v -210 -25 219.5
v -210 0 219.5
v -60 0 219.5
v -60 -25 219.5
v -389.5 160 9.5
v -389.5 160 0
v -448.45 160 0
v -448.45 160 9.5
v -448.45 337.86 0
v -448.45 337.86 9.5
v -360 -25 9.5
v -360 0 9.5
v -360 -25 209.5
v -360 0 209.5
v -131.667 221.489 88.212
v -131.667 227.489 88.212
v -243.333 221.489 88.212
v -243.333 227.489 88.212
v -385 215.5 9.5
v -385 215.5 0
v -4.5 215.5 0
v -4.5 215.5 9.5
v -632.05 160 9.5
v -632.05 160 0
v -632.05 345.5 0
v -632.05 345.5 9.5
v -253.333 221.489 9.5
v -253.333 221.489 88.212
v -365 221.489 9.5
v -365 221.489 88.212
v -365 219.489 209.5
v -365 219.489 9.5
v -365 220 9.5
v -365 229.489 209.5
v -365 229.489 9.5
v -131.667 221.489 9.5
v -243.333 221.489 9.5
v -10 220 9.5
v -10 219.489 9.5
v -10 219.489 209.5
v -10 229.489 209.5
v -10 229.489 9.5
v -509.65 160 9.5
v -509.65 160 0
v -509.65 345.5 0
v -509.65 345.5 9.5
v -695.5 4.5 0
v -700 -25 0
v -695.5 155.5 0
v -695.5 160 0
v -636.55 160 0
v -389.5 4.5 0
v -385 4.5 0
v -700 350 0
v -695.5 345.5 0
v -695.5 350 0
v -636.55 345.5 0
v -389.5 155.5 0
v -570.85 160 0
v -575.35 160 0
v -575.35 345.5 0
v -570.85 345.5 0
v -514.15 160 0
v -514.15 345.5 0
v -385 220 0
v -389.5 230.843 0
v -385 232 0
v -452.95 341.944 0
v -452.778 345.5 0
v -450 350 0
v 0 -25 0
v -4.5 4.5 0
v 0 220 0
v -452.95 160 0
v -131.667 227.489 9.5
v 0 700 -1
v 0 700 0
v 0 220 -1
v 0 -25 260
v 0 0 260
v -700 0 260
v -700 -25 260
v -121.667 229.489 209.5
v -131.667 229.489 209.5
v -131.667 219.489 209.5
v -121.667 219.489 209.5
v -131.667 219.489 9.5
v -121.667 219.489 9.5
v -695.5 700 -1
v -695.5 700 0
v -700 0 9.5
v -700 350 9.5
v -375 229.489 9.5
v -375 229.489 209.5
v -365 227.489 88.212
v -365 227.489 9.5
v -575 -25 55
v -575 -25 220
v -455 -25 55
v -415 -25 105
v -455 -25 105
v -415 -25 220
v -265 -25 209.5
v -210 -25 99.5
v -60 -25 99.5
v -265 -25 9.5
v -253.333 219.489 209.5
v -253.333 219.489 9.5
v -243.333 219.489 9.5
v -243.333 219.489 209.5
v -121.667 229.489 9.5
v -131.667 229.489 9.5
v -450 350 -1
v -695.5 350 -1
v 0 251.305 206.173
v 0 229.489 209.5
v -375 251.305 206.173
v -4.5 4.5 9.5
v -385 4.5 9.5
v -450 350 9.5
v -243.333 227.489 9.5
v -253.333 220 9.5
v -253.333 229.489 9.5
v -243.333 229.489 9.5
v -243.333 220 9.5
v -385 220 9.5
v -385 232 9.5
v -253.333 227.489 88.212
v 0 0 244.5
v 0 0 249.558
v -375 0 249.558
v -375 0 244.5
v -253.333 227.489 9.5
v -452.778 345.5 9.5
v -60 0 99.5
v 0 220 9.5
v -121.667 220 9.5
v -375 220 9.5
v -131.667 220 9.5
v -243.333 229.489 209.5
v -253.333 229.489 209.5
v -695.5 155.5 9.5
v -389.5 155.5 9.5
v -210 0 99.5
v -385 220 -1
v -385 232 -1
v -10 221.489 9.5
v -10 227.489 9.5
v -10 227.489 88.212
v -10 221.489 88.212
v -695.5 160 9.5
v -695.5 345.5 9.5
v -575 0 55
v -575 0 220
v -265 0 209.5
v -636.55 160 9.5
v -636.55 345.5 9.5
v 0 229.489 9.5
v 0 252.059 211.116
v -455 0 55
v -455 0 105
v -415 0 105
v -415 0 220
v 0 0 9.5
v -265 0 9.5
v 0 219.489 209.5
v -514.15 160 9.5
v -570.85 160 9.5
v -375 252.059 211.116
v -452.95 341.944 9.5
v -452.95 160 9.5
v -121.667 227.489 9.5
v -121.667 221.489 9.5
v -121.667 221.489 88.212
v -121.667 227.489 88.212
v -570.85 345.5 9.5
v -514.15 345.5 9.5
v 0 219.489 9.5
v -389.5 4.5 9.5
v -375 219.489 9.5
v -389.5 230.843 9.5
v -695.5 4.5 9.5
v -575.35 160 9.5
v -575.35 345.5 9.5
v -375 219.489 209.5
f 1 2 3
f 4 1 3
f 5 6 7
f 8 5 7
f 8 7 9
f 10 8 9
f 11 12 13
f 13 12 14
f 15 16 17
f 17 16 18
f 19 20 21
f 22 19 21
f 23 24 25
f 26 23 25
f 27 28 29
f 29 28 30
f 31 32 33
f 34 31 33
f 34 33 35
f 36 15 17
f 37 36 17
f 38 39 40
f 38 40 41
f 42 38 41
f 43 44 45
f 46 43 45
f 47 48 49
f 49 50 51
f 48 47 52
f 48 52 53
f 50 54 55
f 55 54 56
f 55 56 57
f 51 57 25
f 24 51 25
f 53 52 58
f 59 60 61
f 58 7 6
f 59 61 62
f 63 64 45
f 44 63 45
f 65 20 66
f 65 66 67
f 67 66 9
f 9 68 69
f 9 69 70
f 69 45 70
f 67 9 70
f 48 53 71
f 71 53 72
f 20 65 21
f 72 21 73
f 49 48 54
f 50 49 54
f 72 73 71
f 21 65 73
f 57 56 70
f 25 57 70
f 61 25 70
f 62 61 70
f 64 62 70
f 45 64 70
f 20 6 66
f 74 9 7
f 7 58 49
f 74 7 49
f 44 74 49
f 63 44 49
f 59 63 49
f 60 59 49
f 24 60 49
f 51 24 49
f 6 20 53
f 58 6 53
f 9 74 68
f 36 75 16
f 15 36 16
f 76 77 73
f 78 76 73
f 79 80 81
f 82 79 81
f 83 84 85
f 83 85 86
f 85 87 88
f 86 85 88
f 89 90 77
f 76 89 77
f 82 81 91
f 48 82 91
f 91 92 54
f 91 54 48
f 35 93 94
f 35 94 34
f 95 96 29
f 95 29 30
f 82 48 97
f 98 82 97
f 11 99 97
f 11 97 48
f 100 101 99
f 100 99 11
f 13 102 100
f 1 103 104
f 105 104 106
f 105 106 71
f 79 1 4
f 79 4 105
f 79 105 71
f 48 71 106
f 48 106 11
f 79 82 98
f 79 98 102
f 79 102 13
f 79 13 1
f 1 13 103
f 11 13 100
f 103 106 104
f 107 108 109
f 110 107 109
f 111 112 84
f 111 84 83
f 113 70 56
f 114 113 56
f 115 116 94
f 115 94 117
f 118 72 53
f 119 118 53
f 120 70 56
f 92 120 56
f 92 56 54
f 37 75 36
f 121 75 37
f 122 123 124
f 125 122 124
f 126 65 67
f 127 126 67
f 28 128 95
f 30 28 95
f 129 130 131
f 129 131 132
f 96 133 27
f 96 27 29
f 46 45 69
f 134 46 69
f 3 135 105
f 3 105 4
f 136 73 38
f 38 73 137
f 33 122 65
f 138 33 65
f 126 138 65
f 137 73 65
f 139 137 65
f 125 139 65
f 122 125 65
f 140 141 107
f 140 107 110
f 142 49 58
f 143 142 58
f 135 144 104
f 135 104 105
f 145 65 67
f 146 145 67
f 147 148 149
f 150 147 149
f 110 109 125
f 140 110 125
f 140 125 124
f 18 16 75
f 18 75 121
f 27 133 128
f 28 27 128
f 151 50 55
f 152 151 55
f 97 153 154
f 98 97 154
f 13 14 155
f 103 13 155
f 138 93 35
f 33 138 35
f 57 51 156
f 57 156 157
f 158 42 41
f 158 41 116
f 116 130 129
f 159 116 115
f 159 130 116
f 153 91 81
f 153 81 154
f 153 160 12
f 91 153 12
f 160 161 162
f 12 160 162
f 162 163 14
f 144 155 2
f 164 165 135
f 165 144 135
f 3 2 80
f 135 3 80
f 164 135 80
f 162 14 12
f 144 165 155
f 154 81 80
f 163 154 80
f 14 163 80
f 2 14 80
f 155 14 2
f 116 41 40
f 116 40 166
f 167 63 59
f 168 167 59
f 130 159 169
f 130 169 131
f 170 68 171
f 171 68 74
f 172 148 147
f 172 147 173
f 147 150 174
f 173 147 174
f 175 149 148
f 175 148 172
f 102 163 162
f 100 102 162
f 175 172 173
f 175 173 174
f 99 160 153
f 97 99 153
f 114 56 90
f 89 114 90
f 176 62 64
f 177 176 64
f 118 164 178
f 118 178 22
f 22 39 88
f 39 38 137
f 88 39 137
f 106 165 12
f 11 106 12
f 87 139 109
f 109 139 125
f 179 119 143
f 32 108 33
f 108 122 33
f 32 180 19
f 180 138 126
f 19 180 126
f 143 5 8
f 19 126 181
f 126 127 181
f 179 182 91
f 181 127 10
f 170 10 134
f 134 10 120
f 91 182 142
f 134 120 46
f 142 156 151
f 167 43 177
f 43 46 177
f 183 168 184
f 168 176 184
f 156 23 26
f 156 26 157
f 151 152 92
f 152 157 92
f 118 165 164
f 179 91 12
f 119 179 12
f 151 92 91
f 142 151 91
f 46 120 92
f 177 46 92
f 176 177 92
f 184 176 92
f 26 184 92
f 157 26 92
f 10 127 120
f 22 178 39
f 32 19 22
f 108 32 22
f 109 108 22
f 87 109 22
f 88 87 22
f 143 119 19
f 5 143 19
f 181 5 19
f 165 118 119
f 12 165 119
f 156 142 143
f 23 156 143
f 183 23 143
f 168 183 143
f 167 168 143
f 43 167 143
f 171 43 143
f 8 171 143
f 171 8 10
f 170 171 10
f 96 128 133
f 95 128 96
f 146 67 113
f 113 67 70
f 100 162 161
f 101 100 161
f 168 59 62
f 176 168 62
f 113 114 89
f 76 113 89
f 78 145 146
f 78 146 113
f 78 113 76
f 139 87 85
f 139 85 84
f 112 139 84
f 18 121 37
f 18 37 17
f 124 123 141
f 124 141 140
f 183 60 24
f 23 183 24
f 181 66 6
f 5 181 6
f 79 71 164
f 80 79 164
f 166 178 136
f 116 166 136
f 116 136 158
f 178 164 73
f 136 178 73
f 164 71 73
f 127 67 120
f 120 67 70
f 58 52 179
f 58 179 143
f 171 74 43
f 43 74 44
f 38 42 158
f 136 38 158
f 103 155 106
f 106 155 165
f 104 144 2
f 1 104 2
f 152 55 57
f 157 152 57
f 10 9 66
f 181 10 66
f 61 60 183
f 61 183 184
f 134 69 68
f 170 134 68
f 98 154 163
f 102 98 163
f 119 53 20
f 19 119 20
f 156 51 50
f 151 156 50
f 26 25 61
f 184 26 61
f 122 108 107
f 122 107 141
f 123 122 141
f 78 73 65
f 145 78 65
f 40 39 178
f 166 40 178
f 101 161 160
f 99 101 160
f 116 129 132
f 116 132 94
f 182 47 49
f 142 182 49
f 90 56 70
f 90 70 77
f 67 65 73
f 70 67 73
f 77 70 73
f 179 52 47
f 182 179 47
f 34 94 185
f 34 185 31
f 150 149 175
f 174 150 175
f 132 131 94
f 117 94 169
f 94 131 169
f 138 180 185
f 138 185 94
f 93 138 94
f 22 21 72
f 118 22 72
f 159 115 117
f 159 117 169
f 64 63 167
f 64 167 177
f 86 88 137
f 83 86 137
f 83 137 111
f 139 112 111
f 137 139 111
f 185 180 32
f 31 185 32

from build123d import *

# Parameters (mm, degrees)
F0_W      = 4.5
F0_H      = 4.5
F0_W_2    = 306
F0_H_2    = 151
F0_W_3    = 380.5
F0_H_3    = 185.5
F1_DEPTH  = 9.5
F2_W      = 150
F2_H      = 120
F3_DEPTH  = 25
F5_DEPTH  = 1
F8_DEPTH  = 260.001
F9_W      = 10
F9_H      = 10
F10_DEPTH = 200
F12_DEPTH = 375
F14_START = -2
F13_W     = 111.6666666667
F13_H     = 78.7117450237
F14_DEPTH = 6


with BuildPart() as f1:
    # F0 (on Top) → F1 (new body)
    with BuildSketch(Plane.XY):
        with Locations((-697.75, 2.25)):
            Rectangle(F0_W, F0_H)
        with Locations((-2.25, 217.75)):
            Rectangle(F0_W, F0_H)
        Polygon((-385, 0), (0, 0), (0, 215.5), (-4.5, 215.5), (-4.5, 4.5), (-385, 4.5), align=None)
        with Locations((-387.25, 2.25)):
            Rectangle(F0_W, F0_H)
        with Locations((-542.5, 2.25)):
            Rectangle(F0_W_2, F0_H)
        with Locations((-697.75, 80)):
            Rectangle(F0_W, F0_H_2)
        with Locations((-697.75, 157.75)):
            Rectangle(F0_W, F0_H)
        with Locations((-194.75, 217.75)):
            Rectangle(F0_W_3, F0_H)
        Polygon((-452.95, 160), (-448.45, 160), (-448.45, 337.8595075378), (-452.6587458478, 345.5), (-452.7784972623, 345.5), (-452.95, 341.9441229224), align=None)
        Polygon((-385, 160), (-385, 215.5), (-385, 220), (-385, 232), (-450, 350), (-700, 350), (-700, 160), (-695.5, 160), (-695.5, 345.5), (-636.55, 345.5), (-632.05, 345.5), (-575.35, 345.5), (-570.85, 345.5), (-514.15, 345.5), (-509.65, 345.5), (-452.7784972623, 345.5), (-452.6587458478, 345.5), (-448.45, 337.8595075378), (-389.5, 230.8425844609), (-389.5, 160), align=None)
        with Locations((-511.9, 252.75)):
            Rectangle(F0_W, F0_H_3)
        with Locations((-573.1, 252.75)):
            Rectangle(F0_W, F0_H_3)
        with Locations((-634.3, 252.75)):
            Rectangle(F0_W, F0_H_3)
        Polygon((-695.5, 155.5), (-389.5, 155.5), (-389.5, 160), (-448.45, 160), (-452.95, 160), (-509.65, 160), (-514.15, 160), (-570.85, 160), (-575.35, 160), (-632.05, 160), (-636.55, 160), (-695.5, 160), align=None)
        with Locations((-387.25, 157.75)):
            Rectangle(F0_W, F0_H)
        with Locations((-387.25, 80)):
            Rectangle(F0_W, F0_H_2)
    extrude(amount=F1_DEPTH)

    # F2 (on face) → F3 (join)
    with BuildSketch(Plane.XZ):
        Polygon((-700, 0), (0, 0), (0, 9.5), (-265, 9.5), (-360, 9.5), (-700, 9.5), align=None)
        Polygon((-265, 9.5), (0, 9.5), (0, 260), (-700, 260), (-700, 9.5), (-360, 9.5), (-360, 209.5), (-265, 209.5), align=None)
        Polygon((-455, 220), (-415, 220), (-415, 105), (-455, 105), (-455, 55), (-575, 55), (-575, 220), align=None, mode=Mode.SUBTRACT)
        with Locations((-135, 159.5)):
            Rectangle(F2_W, F2_H, mode=Mode.SUBTRACT)
    extrude(amount=F3_DEPTH)

    # F4 (on face) → F5 (join)
    with BuildSketch(Plane(origin=(0, 0, 0), x_dir=(1, 0, 0), z_dir=(0, 0, -1))):
        Polygon((0, -700), (0, -220), (-385, -220), (-385, -232), (-450, -350), (-695.5, -350), (-695.5, -700), align=None)
    extrude(amount=F5_DEPTH)

    # F7 (on face) → F8 (cut, through all)
    with BuildSketch(Plane.XY):
        Polygon((-695.5, 350), (-450, 350), (-385, 232), (-385, 220), (0, 220), (0, 700), (-695.5, 700), align=None)
    extrude(amount=F8_DEPTH, mode=Mode.SUBTRACT)

    # F9 (on face) → F10 (join)
    with BuildSketch(Plane.XY.offset(9.5)):
        with Locations((-5, 224.4888156652)):
            Rectangle(F9_W, F9_H)
        with Locations((-370, 224.4888156652)):
            Rectangle(F9_W, F9_H)
        with Locations((-248.3333333333, 224.4888156652)):
            Rectangle(F9_W, F9_H)
        with Locations((-126.6666666667, 224.4888156652)):
            Rectangle(F9_W, F9_H)
    extrude(amount=F10_DEPTH)


with BuildPart() as f12:
    # F11 (on face) → F12 (new body, through all)
    with BuildSketch(Plane.YZ):
        Polygon((251.3053696533, 206.1726945391), (252.0592171334, 211.1155392642), (0, 249.5578161747), (0, 244.5), (229.4888156652, 209.5), align=None)
    extrude(amount=-F12_DEPTH)


with BuildPart() as f14:
    # F13 (on face) → F14 (new body)
    with BuildSketch(Plane(origin=(0, 229.4888156652, 0), x_dir=(-1, 0, 0), z_dir=(0, 1, 0)).offset(F14_START)):
        with Locations((65.8333333333, 48.8558725119)):
            Rectangle(F13_W, F13_H)
    extrude(amount=-F14_DEPTH)


with BuildPart() as f14b:
    # F13 (on face) → F14, piece 2 (new body)
    with BuildSketch(Plane(origin=(0, 229.4888156652, 0), x_dir=(-1, 0, 0), z_dir=(0, 1, 0)).offset(F14_START)):
        with Locations((187.5, 48.8558725119)):
            Rectangle(F13_W, F13_H)
    extrude(amount=-F14_DEPTH)


with BuildPart() as f14c:
    # F13 (on face) → F14, piece 3 (new body)
    with BuildSketch(Plane(origin=(0, 229.4888156652, 0), x_dir=(-1, 0, 0), z_dir=(0, 1, 0)).offset(F14_START)):
        with Locations((309.1666666667, 48.8558725119)):
            Rectangle(F13_W, F13_H)
    extrude(amount=-F14_DEPTH)


solid = Compound([f1.part, f12.part, f14.part, f14b.part, f14c.part])
